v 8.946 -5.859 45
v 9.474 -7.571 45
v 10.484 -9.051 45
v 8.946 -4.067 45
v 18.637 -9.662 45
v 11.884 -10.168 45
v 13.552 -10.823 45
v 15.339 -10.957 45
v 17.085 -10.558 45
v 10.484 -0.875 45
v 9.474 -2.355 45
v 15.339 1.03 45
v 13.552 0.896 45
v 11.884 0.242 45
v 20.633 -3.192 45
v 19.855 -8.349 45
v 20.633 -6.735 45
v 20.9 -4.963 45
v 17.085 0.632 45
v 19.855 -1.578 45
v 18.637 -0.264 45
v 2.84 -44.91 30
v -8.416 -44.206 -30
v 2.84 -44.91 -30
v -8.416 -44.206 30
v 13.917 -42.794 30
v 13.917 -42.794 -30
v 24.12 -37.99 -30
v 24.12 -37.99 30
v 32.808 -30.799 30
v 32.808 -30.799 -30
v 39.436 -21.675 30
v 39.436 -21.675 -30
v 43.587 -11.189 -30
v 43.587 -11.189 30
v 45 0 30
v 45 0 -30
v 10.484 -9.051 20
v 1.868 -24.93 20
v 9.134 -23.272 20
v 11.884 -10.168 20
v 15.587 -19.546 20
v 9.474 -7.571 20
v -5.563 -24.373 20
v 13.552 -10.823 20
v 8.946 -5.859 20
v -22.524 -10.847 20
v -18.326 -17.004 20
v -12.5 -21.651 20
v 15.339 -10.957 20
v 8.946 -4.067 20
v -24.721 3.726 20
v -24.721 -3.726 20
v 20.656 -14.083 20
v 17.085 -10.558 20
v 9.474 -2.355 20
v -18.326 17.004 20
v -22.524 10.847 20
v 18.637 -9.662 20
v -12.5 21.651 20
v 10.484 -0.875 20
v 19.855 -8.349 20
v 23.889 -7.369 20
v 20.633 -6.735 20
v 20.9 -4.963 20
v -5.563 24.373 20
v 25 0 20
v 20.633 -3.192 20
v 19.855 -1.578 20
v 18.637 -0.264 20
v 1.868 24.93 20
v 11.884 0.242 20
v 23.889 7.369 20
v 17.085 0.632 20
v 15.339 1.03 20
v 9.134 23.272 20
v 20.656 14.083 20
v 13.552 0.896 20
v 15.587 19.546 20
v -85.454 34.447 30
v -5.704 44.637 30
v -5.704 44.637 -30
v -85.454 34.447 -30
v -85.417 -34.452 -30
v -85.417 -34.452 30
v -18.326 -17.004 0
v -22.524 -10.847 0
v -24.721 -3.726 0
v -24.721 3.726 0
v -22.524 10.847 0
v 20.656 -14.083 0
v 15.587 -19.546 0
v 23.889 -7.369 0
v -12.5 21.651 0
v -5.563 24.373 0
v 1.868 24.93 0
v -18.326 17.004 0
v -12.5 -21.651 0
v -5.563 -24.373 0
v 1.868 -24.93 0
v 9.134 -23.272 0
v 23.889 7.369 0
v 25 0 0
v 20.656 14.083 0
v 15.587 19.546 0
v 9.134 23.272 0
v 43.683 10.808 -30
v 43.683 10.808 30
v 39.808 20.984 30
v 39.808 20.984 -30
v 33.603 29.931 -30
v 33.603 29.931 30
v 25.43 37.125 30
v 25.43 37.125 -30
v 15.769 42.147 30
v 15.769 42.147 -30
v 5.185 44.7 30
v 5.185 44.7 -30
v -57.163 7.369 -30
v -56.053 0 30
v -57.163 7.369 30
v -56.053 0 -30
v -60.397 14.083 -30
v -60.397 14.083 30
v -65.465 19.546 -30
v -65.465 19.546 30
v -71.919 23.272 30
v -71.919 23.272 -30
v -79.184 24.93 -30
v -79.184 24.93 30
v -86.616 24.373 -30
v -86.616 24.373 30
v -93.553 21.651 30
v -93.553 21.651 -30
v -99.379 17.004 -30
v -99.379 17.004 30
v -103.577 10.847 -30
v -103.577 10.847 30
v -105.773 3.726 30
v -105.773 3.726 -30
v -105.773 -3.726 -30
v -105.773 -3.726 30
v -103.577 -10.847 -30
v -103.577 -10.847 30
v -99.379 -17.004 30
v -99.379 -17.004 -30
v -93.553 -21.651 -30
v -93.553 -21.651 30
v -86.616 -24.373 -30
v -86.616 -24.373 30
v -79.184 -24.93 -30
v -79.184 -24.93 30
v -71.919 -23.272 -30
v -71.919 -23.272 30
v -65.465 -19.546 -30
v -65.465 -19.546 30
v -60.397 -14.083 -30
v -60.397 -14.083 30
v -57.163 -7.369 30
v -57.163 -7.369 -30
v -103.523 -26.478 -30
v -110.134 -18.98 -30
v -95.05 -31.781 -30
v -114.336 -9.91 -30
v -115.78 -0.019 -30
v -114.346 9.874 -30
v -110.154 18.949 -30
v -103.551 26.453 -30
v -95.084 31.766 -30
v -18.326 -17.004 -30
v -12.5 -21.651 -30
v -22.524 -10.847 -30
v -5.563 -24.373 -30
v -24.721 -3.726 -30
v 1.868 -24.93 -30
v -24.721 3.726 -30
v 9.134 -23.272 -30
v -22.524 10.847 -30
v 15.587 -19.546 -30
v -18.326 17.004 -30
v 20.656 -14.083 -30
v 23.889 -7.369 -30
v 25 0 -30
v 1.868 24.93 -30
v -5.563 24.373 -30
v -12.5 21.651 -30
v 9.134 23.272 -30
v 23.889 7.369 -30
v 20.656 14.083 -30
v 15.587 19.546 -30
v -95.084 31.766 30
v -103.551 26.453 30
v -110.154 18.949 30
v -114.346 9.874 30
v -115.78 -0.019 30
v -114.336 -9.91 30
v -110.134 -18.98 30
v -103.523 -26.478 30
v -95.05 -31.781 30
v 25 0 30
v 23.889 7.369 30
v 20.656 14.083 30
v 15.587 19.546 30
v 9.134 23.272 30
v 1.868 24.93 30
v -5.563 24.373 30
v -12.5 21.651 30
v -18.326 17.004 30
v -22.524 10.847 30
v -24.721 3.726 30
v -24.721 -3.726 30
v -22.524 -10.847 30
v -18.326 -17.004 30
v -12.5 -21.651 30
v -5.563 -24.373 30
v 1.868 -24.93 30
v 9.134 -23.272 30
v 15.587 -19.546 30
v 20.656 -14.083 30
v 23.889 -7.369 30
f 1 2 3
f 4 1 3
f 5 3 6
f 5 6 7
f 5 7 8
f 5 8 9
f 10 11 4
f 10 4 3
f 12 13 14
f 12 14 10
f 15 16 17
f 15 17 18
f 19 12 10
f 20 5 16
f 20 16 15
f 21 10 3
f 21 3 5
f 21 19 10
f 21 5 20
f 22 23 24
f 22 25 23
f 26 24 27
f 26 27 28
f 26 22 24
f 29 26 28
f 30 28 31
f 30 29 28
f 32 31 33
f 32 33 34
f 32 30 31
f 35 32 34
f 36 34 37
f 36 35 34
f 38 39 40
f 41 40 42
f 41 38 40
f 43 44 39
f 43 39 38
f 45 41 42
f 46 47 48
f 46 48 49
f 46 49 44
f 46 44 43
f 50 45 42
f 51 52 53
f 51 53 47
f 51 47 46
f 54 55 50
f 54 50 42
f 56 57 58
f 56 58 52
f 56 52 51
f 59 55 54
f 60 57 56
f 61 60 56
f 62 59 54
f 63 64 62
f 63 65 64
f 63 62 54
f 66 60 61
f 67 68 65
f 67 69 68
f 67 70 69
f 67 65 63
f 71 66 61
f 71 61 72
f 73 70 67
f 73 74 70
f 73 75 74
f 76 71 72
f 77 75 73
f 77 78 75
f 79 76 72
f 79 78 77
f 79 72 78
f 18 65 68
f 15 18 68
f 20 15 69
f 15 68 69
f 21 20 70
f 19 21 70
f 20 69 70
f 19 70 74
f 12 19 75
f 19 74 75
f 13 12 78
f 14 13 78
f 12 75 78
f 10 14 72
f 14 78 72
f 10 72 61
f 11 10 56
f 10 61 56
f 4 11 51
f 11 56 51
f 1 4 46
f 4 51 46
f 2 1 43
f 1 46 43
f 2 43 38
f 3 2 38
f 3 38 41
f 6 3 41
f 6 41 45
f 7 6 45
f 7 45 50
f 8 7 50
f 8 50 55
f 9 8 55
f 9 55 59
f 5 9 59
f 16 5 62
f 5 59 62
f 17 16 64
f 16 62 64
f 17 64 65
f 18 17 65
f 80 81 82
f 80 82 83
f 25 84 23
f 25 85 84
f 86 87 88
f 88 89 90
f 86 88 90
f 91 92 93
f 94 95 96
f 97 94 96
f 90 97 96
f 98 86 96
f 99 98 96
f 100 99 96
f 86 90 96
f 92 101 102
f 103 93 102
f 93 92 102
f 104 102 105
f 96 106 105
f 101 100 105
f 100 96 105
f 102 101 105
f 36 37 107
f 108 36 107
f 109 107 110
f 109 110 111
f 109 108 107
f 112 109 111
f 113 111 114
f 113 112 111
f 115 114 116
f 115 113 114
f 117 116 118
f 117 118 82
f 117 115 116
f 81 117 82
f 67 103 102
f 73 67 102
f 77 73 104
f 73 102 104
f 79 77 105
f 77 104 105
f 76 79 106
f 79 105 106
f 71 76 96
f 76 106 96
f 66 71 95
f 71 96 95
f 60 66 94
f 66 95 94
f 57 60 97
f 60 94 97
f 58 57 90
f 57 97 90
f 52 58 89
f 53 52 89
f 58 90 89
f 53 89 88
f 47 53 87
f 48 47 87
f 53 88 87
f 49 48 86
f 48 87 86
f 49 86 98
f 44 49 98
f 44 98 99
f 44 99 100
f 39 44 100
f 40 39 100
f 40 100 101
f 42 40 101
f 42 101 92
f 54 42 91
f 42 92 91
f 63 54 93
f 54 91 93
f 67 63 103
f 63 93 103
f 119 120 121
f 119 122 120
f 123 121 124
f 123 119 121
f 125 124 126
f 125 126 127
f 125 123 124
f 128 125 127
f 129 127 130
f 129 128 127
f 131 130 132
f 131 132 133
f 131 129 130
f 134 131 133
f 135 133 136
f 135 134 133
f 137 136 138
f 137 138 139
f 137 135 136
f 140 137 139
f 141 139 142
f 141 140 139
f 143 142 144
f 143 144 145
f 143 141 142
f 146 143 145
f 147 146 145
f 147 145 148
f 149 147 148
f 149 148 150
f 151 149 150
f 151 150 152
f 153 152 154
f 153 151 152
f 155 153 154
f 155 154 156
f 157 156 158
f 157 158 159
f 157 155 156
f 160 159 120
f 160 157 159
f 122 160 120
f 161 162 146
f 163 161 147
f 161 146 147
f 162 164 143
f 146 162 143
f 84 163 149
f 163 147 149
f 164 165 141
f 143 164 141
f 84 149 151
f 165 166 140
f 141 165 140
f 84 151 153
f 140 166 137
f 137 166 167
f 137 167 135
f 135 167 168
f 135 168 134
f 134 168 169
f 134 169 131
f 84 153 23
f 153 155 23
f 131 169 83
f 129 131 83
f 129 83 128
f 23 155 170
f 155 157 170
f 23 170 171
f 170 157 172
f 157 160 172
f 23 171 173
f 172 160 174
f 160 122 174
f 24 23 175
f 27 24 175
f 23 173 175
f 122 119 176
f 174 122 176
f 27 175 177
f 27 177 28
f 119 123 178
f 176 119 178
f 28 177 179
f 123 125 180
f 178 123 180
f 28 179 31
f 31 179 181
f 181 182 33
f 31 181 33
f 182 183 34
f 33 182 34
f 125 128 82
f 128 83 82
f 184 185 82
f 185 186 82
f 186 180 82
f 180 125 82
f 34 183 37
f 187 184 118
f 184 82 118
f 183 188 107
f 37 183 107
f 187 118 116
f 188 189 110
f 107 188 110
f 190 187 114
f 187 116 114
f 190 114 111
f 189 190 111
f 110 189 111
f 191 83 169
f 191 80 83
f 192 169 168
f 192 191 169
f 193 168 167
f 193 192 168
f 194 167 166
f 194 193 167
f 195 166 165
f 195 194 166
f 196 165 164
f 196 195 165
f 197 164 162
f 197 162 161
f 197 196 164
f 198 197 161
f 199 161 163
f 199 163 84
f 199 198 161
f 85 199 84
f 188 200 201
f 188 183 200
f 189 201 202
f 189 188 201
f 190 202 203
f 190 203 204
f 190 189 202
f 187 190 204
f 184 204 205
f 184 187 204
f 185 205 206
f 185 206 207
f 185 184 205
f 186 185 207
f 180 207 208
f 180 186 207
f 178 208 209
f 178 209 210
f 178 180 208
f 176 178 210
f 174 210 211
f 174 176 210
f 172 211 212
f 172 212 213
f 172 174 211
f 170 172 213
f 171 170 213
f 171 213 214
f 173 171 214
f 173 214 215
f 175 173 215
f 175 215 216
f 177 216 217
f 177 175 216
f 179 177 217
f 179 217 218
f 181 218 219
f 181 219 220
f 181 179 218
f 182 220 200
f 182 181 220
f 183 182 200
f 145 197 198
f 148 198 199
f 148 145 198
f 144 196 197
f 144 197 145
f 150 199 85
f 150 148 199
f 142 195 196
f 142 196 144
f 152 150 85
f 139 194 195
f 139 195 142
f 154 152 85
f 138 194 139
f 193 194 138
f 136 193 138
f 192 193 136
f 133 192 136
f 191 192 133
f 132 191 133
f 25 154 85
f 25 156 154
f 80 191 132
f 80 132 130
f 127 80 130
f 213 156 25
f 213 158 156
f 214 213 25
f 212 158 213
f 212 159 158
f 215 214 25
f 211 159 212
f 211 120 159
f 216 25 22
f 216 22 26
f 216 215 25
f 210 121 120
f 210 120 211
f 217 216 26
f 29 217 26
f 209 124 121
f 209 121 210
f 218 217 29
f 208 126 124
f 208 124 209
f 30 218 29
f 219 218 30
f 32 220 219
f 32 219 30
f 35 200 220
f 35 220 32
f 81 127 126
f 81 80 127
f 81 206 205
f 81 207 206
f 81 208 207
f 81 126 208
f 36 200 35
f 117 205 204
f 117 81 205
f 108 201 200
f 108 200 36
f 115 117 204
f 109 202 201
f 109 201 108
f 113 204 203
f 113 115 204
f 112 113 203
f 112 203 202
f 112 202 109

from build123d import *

# Parameters (mm, degrees)
F0_R     = 25
F1_DEPTH = 30
F2_DEPTH = 20
F3_R     = 6.010222
F4_DEPTH = 25


with BuildPart() as f1:
    # F0 (on Top) → F1 (new body, symmetric)
    with BuildSketch(Plane.XY):
        with BuildLine():
            ThreePointArc((-8.415959, -44.206013), (28.690432, -34.667839), (45, 0))
            ThreePointArc((45, 0), (29.735014, 33.776159), (-5.703508, 44.637092))
            ThreePointArc((-5.703508, 44.637092), (-44.979042, 1.373246), (-8.415959, -44.206013))
        make_face()
        Circle(F0_R, mode=Mode.SUBTRACT)
        with BuildLine():
            ThreePointArc((-8.415959, -44.206013), (-44.979042, 1.373246), (-5.703508, 44.637092))
            Line((-5.703508, 44.637092), (-85.454094, 34.446954))
            ThreePointArc((-85.454094, 34.446954), (-58.105781, 26.065448), (-46.325617, 0))
            ThreePointArc((-46.325617, 0), (-58.091714, -26.053058), (-85.416903, -34.451686))
            Line((-85.416903, -34.451686), (-8.415959, -44.206013))
        make_face()
        with BuildLine():
            ThreePointArc((-46.325617, 0), (-58.105781, 26.065448), (-85.454094, 34.446954))
            ThreePointArc((-85.454094, 34.446954), (-115.77964, -0.018745), (-85.416903, -34.451686))
            ThreePointArc((-85.416903, -34.451686), (-58.091714, -26.053058), (-46.325617, 0))
        make_face()
        with Locations((-81.052631, 0)):
            Circle(F0_R, mode=Mode.SUBTRACT)
    extrude(amount=F1_DEPTH, both=True)


with BuildPart() as f2:
    # F0 (on Top) → F2 (new body)
    with BuildSketch(Plane.XY):
        Circle(F0_R)
    extrude(amount=F2_DEPTH)

    # F3 (on face) → F4 (join)
    with BuildSketch(Plane.XY.offset(20)):
        with Locations((14.889445, -4.963221)):
            Circle(F3_R)
    extrude(amount=F4_DEPTH)


solid = Compound([f1.part, f2.part])
